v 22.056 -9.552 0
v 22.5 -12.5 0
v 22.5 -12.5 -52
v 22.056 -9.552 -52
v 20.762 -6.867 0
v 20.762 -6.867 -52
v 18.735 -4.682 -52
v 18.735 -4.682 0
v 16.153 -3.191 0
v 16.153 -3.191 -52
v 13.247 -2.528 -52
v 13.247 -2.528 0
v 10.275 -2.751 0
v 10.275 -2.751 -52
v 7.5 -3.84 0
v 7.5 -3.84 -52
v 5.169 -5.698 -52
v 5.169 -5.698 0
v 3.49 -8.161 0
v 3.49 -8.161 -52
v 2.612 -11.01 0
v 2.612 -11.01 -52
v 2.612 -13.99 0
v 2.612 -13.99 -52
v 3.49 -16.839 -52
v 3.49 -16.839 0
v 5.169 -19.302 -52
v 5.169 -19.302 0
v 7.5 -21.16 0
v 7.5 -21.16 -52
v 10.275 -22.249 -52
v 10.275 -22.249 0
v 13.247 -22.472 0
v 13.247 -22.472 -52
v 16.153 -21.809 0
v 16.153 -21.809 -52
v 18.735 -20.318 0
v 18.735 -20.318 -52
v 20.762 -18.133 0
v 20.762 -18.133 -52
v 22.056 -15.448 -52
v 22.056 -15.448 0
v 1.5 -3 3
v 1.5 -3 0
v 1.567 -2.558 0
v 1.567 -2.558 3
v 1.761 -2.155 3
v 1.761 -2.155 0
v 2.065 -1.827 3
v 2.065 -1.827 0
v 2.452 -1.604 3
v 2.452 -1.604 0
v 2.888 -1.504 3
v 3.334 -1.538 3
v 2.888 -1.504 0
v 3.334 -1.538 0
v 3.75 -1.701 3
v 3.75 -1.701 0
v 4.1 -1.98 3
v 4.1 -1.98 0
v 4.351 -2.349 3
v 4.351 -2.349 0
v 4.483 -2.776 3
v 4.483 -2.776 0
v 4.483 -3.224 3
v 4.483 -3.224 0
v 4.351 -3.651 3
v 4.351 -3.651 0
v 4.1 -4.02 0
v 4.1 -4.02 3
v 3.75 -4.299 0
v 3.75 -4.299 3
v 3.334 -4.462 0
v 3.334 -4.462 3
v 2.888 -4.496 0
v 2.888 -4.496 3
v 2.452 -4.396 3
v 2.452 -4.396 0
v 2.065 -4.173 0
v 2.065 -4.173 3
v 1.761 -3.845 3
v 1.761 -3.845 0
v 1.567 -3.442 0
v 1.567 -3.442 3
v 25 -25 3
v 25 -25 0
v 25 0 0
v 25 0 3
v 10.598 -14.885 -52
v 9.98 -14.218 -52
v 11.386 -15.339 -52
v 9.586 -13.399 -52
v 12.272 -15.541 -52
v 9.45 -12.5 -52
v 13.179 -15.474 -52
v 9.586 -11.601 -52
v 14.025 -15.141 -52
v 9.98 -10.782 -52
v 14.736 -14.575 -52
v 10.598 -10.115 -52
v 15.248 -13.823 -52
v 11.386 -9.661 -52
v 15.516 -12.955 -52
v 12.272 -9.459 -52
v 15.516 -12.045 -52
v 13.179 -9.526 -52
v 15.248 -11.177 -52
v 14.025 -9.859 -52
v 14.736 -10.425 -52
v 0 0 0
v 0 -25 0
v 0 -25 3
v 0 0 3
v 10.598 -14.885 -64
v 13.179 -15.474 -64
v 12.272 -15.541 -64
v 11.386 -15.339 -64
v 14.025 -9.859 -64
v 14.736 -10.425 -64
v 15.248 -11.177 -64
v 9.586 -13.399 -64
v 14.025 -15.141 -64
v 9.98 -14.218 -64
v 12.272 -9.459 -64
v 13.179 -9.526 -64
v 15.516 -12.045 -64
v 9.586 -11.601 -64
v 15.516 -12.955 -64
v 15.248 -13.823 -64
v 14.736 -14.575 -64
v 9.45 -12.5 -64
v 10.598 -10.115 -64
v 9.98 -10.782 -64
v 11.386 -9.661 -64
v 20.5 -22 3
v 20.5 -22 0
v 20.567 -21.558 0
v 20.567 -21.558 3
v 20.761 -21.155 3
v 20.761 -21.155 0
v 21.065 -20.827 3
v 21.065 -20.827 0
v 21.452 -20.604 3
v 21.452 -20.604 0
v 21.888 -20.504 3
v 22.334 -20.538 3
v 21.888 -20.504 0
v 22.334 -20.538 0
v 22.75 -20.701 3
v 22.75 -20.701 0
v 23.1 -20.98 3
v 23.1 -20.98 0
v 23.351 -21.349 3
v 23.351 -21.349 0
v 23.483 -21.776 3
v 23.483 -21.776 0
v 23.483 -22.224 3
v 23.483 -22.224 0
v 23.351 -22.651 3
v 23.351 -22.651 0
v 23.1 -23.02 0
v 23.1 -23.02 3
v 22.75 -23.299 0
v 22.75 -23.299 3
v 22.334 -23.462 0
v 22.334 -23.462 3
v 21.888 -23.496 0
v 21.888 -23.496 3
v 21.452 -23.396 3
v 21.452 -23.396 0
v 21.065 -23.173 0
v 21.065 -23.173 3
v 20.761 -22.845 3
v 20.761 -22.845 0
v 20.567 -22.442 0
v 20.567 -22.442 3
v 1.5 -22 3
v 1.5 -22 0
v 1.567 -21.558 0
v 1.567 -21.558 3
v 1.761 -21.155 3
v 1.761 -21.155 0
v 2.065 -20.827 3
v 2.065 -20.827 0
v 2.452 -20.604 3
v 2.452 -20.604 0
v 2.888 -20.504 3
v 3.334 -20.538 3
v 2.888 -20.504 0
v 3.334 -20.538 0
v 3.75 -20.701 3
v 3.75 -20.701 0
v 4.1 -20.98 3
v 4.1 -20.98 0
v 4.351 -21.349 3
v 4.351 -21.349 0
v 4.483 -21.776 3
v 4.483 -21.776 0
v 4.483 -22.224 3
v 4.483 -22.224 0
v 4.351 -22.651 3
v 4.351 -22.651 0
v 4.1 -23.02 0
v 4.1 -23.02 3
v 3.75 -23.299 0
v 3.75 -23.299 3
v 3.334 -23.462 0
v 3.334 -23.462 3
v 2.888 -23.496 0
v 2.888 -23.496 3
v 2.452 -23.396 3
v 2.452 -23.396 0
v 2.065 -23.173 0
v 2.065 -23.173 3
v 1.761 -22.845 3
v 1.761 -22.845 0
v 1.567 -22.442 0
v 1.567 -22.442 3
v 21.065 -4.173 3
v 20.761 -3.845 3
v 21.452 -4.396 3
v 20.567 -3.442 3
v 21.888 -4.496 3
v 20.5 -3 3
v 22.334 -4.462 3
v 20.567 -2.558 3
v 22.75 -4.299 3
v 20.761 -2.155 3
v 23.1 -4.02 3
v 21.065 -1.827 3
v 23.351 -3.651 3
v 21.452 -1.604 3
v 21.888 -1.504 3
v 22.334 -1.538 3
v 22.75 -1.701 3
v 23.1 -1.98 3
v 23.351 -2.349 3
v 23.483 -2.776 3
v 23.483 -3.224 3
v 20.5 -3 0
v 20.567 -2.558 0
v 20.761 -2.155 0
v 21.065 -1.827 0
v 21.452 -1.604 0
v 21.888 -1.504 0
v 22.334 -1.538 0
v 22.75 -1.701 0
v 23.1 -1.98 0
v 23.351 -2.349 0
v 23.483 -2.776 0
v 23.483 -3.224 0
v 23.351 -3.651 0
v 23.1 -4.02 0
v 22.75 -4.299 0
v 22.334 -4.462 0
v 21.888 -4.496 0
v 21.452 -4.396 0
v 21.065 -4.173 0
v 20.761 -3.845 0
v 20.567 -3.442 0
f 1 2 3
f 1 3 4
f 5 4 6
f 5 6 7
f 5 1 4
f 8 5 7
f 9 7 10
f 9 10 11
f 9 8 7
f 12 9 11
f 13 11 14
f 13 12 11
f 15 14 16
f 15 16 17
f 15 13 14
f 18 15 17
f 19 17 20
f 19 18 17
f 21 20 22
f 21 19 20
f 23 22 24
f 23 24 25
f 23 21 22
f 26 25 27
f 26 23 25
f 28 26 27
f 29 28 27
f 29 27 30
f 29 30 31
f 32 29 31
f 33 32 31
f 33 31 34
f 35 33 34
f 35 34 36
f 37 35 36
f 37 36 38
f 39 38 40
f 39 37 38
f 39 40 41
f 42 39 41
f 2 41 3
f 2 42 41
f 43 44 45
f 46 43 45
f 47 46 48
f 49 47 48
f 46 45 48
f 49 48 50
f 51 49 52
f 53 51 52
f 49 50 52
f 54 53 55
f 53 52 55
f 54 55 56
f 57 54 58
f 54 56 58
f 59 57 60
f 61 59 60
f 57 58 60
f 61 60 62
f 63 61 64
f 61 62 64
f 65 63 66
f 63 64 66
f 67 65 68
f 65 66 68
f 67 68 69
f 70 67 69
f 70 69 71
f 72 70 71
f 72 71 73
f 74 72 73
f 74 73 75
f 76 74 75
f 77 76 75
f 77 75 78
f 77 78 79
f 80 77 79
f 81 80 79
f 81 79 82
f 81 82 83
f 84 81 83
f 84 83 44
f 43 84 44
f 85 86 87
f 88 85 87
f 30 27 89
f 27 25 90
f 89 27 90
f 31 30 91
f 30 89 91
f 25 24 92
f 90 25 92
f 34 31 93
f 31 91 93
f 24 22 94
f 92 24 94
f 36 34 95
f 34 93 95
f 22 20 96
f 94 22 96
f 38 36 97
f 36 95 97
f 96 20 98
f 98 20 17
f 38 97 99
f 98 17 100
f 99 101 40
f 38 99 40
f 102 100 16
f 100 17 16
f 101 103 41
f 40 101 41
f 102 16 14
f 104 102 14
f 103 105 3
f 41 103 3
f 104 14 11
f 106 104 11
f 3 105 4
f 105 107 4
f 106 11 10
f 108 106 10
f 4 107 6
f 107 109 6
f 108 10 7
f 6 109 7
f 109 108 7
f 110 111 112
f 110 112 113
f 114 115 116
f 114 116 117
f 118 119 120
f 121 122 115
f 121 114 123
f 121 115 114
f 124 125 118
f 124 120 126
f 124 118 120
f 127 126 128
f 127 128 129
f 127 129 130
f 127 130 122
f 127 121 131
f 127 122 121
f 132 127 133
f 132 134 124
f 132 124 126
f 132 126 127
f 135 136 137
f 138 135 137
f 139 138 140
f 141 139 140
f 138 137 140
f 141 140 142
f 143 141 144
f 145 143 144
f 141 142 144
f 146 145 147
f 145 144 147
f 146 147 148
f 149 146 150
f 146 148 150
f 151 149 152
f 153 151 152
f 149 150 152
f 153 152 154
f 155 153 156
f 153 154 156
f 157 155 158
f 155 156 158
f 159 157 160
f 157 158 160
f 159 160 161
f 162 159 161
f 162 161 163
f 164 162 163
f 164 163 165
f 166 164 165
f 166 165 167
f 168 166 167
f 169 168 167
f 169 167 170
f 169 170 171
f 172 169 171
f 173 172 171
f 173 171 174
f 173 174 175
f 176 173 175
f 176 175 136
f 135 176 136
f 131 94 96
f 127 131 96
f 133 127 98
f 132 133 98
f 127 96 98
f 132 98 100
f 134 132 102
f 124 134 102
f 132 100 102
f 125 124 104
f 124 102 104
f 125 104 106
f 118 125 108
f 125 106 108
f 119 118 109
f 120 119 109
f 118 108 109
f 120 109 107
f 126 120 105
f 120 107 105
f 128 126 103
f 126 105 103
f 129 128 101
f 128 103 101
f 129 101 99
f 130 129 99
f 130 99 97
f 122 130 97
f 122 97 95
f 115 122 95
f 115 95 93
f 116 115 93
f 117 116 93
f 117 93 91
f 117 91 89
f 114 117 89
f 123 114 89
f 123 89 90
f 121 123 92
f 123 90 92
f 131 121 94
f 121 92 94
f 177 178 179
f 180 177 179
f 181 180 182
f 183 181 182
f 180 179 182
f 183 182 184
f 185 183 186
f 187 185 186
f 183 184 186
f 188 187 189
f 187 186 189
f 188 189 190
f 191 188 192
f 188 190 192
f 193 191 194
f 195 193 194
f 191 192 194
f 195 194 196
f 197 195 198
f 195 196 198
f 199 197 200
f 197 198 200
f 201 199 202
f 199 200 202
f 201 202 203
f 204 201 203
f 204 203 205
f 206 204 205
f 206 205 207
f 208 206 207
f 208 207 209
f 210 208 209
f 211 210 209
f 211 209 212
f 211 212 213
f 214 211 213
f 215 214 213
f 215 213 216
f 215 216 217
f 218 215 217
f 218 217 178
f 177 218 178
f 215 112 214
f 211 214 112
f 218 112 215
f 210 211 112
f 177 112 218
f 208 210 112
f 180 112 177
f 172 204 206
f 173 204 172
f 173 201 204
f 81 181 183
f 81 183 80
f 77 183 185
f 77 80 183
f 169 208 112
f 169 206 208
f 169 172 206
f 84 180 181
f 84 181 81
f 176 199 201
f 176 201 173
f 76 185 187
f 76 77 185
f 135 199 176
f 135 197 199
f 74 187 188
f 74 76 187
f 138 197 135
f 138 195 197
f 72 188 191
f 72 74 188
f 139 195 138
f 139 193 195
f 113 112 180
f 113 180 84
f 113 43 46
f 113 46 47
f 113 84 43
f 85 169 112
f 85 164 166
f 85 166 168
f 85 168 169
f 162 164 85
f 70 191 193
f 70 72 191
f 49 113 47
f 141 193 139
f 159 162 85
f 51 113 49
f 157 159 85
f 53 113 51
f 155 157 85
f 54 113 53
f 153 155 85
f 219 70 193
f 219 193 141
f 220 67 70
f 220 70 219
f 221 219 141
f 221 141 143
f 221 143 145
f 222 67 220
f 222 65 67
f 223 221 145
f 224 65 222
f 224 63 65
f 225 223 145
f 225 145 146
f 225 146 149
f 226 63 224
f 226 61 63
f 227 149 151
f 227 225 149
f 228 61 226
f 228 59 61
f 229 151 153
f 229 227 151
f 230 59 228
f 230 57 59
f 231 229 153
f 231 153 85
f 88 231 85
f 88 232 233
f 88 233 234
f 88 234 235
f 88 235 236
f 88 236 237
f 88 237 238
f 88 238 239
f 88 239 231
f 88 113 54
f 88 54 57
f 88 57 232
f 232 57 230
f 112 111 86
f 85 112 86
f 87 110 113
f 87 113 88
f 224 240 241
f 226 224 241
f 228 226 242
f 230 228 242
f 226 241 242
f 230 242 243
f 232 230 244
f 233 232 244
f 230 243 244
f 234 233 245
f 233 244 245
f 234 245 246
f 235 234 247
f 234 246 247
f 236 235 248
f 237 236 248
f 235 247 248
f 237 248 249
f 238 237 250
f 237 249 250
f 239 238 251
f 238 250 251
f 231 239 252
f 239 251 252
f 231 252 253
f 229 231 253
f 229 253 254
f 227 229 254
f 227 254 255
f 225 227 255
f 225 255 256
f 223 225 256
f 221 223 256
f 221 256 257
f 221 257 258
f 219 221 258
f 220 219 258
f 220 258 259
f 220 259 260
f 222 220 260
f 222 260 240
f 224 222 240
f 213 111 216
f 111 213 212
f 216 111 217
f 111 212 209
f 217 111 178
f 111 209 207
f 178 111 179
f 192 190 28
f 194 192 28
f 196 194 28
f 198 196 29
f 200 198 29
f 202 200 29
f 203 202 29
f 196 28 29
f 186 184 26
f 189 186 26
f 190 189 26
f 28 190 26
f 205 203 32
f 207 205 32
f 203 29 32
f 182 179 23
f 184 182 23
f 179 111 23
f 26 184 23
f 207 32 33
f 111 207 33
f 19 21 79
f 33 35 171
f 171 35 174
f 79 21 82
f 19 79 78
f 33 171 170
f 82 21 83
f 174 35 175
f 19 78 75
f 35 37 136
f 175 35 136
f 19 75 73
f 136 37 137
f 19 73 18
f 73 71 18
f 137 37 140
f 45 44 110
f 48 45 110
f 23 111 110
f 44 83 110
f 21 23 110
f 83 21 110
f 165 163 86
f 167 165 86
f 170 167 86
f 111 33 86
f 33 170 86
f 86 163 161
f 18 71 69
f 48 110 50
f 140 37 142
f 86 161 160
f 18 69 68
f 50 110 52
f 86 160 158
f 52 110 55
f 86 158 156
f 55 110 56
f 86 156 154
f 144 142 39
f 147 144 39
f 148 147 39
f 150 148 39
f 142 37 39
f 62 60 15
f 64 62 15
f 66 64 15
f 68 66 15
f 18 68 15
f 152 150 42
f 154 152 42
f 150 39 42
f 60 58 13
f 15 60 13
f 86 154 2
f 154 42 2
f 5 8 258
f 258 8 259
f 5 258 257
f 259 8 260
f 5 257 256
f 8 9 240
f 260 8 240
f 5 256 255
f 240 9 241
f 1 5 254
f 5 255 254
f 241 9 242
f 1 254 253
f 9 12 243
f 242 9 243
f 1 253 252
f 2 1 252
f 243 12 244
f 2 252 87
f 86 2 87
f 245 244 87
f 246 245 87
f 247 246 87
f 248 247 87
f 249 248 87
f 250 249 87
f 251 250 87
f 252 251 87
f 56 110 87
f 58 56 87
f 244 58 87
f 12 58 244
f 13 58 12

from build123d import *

# Parameters (mm, degrees)
SKETCH_2_W          = 25
SKETCH_2_H          = 25
EXTRUDE_1_DEPTH     = 3
SKETCH_3_R          = 1.5
CUT_EXTRUDE_2_DEPTH = 4
EXTRUDE_START       = -3
SKETCH_4_R          = 10
EXTRUDE_2_DEPTH     = 52
SKETCH_5_R          = 3.05
EXTRUDE_3_DEPTH     = 12


with BuildPart() as part:
    # 草图2 → 凸台-拉伸1 (new body)
    with BuildSketch(Plane.XY):
        with Locations((12.5, -12.5)):
            Rectangle(SKETCH_2_W, SKETCH_2_H)
    extrude(amount=EXTRUDE_1_DEPTH)

    # 草图3 → 切除-拉伸2 (cut, through all)
    with BuildSketch(Plane(origin=(0, 0, 0), x_dir=(-1, 0, 0), z_dir=(0, 0, -1))):
        with Locations((-22, -3)):
            Circle(SKETCH_3_R)
        with Locations((-3, -3)):
            Circle(SKETCH_3_R)
        with Locations((-3, -22)):
            Circle(SKETCH_3_R)
        with Locations((-22, -22)):
            Circle(SKETCH_3_R)
    extrude(amount=-CUT_EXTRUDE_2_DEPTH, mode=Mode.SUBTRACT)

    # 草图4 → 凸台-拉伸2 (add)
    with BuildSketch(Plane.XY.offset(3).offset(EXTRUDE_START)):
        with Locations((12.5, -12.5)):
            Circle(SKETCH_4_R)
    extrude(amount=-EXTRUDE_2_DEPTH)

    # 草图5 → 凸台-拉伸3 (add)
    with BuildSketch(Plane(origin=(0, 0, -52), x_dir=(-1, 0, 0), z_dir=(0, 0, -1))):
        with Locations((-12.5, -12.5)):
            Circle(SKETCH_5_R)
    extrude(amount=EXTRUDE_3_DEPTH)


solid = part.part
